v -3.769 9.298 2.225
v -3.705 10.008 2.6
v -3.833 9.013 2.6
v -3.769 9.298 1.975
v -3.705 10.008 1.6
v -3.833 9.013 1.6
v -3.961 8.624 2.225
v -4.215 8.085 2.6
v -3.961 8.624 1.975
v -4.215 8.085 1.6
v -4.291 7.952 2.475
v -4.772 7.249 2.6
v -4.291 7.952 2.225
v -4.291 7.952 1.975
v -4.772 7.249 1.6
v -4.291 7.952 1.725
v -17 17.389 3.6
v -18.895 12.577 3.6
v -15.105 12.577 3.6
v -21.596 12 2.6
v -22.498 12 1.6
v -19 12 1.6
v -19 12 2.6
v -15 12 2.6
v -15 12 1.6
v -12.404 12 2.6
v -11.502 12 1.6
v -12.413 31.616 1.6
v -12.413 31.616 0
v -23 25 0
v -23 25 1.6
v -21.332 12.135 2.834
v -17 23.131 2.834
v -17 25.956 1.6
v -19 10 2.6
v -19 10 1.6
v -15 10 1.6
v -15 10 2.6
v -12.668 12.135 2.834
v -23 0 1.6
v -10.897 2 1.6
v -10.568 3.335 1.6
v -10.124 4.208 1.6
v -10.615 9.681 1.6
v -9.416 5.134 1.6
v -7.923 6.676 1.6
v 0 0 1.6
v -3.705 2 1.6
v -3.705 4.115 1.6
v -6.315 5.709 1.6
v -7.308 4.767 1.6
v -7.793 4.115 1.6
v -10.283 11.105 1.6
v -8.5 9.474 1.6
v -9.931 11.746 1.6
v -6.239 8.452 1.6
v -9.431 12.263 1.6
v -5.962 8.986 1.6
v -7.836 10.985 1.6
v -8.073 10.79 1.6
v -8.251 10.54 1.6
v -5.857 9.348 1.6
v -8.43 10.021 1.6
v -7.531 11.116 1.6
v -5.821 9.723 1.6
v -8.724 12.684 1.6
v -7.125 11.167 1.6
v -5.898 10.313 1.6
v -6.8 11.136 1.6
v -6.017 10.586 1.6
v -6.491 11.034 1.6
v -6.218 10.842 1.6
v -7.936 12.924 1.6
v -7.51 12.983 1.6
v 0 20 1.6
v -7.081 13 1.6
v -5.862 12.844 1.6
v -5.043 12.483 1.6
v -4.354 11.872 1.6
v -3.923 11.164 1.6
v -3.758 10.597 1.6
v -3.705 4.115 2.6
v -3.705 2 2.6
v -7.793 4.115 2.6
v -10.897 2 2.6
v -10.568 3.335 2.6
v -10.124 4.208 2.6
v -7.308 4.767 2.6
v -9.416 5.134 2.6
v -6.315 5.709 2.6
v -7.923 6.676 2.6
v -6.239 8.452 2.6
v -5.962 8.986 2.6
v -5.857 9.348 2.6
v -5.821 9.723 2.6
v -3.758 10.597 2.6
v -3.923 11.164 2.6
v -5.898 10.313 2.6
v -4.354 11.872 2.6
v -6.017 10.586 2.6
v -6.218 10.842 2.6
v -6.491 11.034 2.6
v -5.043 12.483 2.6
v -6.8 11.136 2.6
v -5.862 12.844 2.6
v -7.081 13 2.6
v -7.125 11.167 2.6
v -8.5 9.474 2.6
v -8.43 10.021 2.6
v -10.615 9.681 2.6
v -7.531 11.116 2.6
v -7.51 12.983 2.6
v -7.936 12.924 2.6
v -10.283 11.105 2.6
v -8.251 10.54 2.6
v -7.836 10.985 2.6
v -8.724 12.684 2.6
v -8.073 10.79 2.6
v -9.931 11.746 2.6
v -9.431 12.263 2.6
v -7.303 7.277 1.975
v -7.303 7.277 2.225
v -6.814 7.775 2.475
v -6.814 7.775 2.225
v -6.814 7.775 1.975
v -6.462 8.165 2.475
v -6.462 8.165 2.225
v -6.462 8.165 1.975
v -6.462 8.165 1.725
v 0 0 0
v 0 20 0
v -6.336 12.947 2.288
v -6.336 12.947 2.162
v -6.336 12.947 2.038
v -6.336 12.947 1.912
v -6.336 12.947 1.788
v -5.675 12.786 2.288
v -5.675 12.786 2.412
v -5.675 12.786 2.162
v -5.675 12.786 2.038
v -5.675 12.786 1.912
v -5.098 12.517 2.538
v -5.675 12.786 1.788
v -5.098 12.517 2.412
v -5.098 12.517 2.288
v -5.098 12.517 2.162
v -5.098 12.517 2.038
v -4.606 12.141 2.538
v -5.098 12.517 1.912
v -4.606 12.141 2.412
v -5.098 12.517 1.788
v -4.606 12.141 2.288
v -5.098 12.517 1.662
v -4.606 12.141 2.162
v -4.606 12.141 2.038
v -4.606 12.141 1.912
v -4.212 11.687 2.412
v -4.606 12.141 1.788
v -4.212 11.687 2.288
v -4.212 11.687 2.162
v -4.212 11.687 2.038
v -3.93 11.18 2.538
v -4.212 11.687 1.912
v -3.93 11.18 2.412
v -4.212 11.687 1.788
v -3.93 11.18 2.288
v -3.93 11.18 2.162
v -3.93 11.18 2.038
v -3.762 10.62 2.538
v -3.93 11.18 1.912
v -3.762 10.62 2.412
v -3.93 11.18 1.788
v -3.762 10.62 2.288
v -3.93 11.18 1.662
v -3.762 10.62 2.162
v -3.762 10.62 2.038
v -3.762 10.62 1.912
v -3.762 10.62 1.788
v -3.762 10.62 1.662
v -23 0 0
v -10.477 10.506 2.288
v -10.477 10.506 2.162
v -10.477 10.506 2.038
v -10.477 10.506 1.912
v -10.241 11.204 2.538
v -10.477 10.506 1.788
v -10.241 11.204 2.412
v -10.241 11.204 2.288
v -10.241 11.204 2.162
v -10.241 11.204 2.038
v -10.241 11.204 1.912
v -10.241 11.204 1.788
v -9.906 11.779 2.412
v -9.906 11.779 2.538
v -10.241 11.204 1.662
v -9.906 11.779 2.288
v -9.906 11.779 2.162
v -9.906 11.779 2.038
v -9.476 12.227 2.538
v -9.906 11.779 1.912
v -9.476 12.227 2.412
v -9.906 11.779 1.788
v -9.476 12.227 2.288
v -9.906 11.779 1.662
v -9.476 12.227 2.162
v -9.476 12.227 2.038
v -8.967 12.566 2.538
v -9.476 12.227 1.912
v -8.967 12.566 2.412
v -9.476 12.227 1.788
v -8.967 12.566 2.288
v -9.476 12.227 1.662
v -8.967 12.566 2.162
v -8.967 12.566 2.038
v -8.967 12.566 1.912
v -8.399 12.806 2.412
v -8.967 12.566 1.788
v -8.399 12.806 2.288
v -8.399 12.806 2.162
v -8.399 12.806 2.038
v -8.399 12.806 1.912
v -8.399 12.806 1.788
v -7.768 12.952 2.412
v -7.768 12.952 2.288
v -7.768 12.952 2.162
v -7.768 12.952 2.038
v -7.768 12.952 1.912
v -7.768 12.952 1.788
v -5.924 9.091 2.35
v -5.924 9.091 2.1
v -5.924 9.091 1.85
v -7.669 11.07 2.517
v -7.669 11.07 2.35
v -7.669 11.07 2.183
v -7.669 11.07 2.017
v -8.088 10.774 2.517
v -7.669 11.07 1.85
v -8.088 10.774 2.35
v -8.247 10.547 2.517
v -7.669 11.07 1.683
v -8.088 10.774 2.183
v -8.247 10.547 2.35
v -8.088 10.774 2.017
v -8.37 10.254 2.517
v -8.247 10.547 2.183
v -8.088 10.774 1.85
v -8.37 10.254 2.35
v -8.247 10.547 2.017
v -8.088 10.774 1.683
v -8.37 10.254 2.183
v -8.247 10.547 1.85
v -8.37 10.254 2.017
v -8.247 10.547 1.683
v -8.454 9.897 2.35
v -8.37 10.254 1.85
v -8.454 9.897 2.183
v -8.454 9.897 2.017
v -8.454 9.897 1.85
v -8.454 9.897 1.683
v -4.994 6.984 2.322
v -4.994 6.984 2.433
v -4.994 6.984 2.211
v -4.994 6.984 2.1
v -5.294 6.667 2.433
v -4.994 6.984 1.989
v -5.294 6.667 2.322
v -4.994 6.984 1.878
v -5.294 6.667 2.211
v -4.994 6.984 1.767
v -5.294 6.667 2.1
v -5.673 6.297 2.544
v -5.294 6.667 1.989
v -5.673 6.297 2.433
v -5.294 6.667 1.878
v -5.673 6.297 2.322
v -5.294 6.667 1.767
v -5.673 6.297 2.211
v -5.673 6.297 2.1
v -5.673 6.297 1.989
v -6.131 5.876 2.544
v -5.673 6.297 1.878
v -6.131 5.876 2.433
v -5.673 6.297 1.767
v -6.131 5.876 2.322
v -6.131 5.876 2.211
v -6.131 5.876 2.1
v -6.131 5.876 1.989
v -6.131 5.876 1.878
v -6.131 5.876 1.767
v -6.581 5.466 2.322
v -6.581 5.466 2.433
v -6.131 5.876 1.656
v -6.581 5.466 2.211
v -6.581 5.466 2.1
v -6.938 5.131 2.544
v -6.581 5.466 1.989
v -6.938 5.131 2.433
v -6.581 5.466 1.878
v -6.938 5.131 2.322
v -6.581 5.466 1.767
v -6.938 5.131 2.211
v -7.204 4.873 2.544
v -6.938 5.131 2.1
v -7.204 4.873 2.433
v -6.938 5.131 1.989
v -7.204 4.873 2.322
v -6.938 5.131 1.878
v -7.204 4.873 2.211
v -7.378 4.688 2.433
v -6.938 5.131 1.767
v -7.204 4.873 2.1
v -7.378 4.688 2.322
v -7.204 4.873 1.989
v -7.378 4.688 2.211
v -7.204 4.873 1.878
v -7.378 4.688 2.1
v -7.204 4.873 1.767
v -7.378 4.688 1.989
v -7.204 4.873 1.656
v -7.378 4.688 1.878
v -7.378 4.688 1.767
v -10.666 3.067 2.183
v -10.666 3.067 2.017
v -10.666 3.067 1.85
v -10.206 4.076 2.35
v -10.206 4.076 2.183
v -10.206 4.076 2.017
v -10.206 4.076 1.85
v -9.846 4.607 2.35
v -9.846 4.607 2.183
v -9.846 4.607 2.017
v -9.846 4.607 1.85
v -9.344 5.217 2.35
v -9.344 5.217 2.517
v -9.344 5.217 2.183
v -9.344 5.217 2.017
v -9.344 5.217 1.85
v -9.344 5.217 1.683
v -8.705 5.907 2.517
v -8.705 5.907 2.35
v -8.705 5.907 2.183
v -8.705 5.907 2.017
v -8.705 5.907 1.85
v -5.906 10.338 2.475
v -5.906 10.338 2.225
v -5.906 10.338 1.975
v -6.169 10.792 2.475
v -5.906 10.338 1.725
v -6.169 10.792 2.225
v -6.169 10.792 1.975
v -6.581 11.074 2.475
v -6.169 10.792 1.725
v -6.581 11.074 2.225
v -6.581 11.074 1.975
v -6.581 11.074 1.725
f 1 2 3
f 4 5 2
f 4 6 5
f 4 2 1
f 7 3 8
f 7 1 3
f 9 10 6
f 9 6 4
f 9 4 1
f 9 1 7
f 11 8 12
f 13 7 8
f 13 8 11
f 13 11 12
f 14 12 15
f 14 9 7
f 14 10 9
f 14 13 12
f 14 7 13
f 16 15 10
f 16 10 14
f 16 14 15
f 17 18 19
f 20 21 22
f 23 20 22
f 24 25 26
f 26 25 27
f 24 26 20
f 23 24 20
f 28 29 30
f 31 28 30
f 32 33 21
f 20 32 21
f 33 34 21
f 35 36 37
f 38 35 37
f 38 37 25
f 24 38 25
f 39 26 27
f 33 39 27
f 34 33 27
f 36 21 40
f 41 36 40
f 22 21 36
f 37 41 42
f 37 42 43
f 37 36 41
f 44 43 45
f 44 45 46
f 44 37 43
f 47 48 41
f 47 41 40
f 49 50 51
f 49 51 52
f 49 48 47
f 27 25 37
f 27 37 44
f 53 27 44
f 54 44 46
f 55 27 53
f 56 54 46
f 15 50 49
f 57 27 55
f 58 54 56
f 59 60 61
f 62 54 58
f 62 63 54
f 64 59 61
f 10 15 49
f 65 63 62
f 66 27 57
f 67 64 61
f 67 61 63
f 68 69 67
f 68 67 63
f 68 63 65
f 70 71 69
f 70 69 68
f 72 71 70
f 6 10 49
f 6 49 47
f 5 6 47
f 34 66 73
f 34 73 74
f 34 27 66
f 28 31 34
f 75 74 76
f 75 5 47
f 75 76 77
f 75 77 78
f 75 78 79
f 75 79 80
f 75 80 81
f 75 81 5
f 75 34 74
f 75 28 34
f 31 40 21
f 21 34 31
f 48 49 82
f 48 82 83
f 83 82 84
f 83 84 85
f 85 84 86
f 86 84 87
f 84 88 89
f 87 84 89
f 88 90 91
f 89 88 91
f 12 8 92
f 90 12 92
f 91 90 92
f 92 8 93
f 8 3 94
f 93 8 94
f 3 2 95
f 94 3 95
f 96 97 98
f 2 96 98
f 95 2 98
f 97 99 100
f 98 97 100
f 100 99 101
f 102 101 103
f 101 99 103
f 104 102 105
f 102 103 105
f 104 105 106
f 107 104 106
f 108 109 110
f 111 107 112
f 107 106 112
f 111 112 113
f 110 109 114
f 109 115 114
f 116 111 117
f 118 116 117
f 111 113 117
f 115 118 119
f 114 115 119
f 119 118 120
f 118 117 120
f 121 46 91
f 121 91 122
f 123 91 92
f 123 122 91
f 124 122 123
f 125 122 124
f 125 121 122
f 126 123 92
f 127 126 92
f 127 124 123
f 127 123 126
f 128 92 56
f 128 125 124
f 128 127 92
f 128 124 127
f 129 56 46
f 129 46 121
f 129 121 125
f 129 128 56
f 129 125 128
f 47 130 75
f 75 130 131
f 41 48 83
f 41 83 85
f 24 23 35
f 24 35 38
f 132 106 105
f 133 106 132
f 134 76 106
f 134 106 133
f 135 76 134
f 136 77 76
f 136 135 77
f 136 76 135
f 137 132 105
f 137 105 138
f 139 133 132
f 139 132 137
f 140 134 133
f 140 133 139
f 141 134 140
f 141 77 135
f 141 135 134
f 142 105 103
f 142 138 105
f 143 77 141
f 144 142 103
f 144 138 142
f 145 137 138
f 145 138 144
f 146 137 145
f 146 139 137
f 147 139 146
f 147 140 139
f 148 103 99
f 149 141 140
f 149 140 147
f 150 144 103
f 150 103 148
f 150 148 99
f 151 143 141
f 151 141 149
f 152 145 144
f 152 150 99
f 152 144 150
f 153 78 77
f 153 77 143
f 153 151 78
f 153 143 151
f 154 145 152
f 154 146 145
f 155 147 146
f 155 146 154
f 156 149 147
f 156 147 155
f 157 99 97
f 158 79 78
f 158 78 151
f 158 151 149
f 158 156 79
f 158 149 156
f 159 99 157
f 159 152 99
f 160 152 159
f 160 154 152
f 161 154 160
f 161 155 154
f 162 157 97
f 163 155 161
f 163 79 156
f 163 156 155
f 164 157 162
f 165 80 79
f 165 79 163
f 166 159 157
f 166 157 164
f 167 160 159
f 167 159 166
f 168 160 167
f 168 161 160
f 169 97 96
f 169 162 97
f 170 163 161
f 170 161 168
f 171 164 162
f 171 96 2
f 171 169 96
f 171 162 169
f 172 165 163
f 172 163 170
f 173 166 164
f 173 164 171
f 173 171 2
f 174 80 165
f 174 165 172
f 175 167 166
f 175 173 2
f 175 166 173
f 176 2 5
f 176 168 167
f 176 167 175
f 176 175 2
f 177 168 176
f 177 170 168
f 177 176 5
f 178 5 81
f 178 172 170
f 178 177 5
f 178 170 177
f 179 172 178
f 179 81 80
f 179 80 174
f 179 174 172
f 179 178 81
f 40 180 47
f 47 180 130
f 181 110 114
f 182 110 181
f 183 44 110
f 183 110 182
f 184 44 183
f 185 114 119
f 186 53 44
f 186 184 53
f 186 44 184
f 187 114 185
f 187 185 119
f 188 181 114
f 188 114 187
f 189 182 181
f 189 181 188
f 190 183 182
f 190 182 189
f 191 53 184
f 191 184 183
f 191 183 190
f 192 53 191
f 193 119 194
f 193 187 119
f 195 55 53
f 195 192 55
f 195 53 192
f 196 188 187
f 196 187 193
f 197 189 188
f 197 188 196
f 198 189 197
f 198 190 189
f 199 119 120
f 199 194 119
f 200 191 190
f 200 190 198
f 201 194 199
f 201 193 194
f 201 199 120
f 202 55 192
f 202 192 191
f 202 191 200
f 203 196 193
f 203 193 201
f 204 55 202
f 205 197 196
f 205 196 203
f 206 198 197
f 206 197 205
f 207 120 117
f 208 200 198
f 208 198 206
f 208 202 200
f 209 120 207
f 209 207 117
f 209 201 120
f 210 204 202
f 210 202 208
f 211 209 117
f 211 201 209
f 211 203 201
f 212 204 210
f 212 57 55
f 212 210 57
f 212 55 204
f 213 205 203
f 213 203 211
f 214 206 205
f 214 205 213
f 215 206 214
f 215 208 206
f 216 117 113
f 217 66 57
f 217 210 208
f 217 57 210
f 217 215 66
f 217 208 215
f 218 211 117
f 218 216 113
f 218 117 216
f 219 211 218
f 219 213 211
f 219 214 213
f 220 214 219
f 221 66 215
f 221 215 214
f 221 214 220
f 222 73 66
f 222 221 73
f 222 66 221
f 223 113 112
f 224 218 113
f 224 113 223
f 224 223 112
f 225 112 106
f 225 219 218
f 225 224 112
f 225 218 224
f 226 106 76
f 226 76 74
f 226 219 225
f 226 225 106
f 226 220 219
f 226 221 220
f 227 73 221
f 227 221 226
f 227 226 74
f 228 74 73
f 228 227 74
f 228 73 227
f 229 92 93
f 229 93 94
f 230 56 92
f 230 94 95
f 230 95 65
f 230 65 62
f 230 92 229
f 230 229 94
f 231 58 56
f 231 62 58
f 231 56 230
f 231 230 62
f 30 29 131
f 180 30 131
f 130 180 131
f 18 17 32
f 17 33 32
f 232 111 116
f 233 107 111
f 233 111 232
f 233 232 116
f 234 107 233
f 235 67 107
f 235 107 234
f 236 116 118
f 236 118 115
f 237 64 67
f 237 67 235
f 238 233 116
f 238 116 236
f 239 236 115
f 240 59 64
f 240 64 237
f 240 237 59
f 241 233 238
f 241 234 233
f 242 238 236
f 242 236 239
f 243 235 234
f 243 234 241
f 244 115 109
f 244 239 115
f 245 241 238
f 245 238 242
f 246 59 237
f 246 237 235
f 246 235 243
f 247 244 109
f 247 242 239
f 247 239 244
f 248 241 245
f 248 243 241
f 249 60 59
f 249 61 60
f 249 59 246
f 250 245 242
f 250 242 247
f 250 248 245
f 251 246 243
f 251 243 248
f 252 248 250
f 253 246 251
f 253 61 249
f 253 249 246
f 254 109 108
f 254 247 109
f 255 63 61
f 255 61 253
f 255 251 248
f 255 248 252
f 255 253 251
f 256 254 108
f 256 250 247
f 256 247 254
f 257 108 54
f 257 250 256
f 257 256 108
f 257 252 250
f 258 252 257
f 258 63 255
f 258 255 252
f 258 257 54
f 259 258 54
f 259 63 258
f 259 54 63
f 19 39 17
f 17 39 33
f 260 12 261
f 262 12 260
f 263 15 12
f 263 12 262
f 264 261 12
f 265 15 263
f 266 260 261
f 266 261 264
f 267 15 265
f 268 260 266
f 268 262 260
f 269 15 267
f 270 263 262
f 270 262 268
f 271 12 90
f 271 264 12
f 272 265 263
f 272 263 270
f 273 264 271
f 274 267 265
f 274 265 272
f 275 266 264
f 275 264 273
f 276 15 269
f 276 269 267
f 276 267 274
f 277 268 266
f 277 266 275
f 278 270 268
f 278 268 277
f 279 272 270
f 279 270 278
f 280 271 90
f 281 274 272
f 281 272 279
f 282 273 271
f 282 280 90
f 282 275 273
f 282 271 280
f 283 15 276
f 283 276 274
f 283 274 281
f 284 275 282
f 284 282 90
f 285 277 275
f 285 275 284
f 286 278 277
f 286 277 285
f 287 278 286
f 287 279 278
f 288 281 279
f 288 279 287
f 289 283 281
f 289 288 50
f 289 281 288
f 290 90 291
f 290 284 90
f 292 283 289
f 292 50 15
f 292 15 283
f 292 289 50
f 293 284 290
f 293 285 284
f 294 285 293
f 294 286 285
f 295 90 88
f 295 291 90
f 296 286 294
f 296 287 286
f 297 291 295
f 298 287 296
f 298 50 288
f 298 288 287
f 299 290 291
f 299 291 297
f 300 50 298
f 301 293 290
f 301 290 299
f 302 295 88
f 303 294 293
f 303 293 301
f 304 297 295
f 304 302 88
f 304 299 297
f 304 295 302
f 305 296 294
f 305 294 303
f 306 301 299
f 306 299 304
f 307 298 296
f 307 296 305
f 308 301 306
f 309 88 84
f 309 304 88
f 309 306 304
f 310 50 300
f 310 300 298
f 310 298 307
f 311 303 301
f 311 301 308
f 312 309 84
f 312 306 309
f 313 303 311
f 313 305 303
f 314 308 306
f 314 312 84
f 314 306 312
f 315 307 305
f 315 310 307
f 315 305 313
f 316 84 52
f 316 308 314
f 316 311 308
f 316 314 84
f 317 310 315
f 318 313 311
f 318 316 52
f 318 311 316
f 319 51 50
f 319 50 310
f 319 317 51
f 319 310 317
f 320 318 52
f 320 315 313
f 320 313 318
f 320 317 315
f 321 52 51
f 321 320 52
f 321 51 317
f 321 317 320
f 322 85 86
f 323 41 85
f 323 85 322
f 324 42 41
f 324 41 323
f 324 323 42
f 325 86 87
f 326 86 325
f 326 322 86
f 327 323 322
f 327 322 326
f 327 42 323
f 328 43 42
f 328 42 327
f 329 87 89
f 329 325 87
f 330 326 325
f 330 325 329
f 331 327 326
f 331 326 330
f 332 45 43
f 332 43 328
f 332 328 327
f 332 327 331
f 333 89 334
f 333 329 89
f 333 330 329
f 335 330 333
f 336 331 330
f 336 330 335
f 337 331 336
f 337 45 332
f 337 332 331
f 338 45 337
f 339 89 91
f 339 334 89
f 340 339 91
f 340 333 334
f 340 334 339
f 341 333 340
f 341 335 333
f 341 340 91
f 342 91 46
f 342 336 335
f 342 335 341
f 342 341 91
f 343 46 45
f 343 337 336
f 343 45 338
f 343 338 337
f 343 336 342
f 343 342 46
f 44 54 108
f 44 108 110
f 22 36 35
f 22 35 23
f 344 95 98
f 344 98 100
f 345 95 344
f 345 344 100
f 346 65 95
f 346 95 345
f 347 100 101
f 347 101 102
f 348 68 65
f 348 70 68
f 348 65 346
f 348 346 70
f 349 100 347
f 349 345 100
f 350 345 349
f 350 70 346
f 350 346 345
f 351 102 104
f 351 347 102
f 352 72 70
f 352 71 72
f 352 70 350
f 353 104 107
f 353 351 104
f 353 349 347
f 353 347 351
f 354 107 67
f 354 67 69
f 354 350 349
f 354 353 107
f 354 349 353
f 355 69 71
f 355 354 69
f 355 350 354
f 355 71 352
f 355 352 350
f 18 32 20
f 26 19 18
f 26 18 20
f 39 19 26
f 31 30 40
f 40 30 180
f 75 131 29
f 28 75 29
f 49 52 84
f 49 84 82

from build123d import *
from OCP.BRepFilletAPI import BRepFilletAPI_MakeChamfer

# Parameters (mm, degrees)
P_IDAT_VYSUNUT_M5_DEPTH = 1.6
P_IDAT_VYSUNUT_M6_DEPTH = 2
SKICA2_7_W              = 2
SKICA2_7_H              = 2
P_IDAT_VYSUNUT_M7_DEPTH = 1
P_IDAT_VYSUNUT_M8_DEPTH = 1
ZKOSEN_5_SIZE2          = 1.678199262
ZKOSEN_5_SIZE           = 2
ZKOSEN_8_SIZE2          = 2
ZKOSEN_8_SIZE           = 1.678199262
ZKOSEN_12_SIZE          = 1.461883237
ZKOSEN_12_SIZE_2        = 1
ZKOSEN_12_SIZE_3        = 0.577350269


with BuildPart() as part:
    # Skica1 → Přidat vysunutím5 (new body)
    with BuildSketch(Plane.XY):
        Polygon((0, 0), (0, 20), (-12.412784718, 31.615626352), (-23, 25), (-23, 0), align=None)
    extrude(amount=P_IDAT_VYSUNUT_M5_DEPTH)

    # Skica2 → Přidat vysunutím6 (add)
    with BuildSketch(Plane.XY.offset(1.6)):
        Polygon((-17, 25.95626352), (-17, 12), (-15, 12), (-11.502481599, 12), align=None)
        Polygon((-22.497518401, 12), (-19, 12), (-17, 12), (-17, 25.95626352), align=None)
    extrude(amount=P_IDAT_VYSUNUT_M6_DEPTH)

    # Skica2<7> → Přidat vysunutím7 (add)
    with BuildSketch(Plane.XY.offset(1.6)):
        with Locations((-16, 11)):
            Rectangle(SKICA2_7_W, SKICA2_7_H)
        with Locations((-18, 11)):
            Rectangle(SKICA2_7_W, SKICA2_7_H)
    extrude(amount=P_IDAT_VYSUNUT_M7_DEPTH)

    # Skica3 → Přidat vysunutím8 (add)
    with BuildSketch(Plane.XY.offset(1.6)):
        with BuildLine():
            Line((-3.705128205, 4.115384615), (-3.705128205, 2))
            Line((-3.705128205, 2), (-10.897435897, 2))
            add(Edge.make_bspline(
                [(-10.897435897, 2), (-10.87308441, 2.180790308), (-10.824395089, 2.542269551), (-10.673865117, 3.070299742), (-10.472959166, 3.585566992), (-10.254913916, 4.004869463), (-10.038043764, 4.342393523), (-9.841277463, 4.618963346), (-9.60654249, 4.913221767), (-9.337245105, 5.227544267), (-9.034873554, 5.562913411), (-8.697171951, 5.918082368), (-8.322529407, 6.291350846), (-8.058961705, 6.54481851), (-7.922676282, 6.67588141)],
                knots=[0, 0, 0, 0, 1.156289446, 2.311930546, 3.473459201, 4.661751613, 5.303057008, 6.018253237, 6.81459331, 7.690699809, 8.644447906, 9.679642995, 10.800191253, 12, 12, 12, 12], degree=3))
            add(Edge.make_bspline(
                [(-7.922676282, 6.67588141), (-7.813918956, 6.780862005), (-7.606877039, 6.980714138), (-7.312048947, 7.266894293), (-7.052864674, 7.529975199), (-6.823905036, 7.763139303), (-6.630459323, 7.972323552), (-6.469982936, 8.154242742), (-6.34044346, 8.309637702), (-6.270284768, 8.408220362), (-6.239182692, 8.451923077)],
                knots=[0, 0, 0, 0, 1.480720495, 2.818855715, 4.024636094, 5.098235712, 6.019786162, 6.815086302, 7.474715479, 8, 8, 8, 8], degree=3))
            add(Edge.make_bspline(
                [(-6.239182692, 8.451923077), (-6.175493233, 8.557718073), (-6.052643645, 8.761784362), (-5.91792888, 9.082682292), (-5.837068057, 9.403513936), (-5.825971765, 9.617891805), (-5.820512821, 9.723357372)],
                knots=[0, 0, 0, 0, 1.0911822, 2.104764037, 3.067617678, 4, 4, 4, 4], degree=3))
            add(Edge.make_bspline(
                [(-5.820512821, 9.723357372), (-5.824474653, 9.833108474), (-5.831970132, 10.040748999), (-5.894821019, 10.333768175), (-6.006276867, 10.585659667), (-6.15973106, 10.797196661), (-6.353774193, 10.962935085), (-6.580616259, 11.085399693), (-6.843577862, 11.153106661), (-7.028402789, 11.16201224), (-7.125, 11.166666667)],
                knots=[0, 0, 0, 0, 1.193122327, 2.257294386, 3.237245624, 4.168877528, 5.075331632, 5.990371598, 6.949684428, 8, 8, 8, 8], degree=3))
            add(Edge.make_bspline(
                [(-7.125, 11.166666667), (-7.220944609, 11.16231978), (-7.406288878, 11.153922533), (-7.669703299, 11.080565334), (-7.900142302, 10.953576306), (-8.06436539, 10.808860058), (-8.175305876, 10.668134018), (-8.250896853, 10.545500545), (-8.316050374, 10.406151312), (-8.37378183, 10.251655158), (-8.419383153, 10.080242168), (-8.456107626, 9.893217825), (-8.485702239, 9.689575671), (-8.495113848, 9.547907653), (-8.5, 9.474358974)],
                knots=[0, 0, 0, 0, 1.402788338, 2.709884207, 3.961032948, 5.225417836, 5.883680772, 6.578928686, 7.329201998, 8.132101139, 8.990263233, 9.922304639, 10.921339128, 12, 12, 12, 12], degree=3))
            Line((-8.5, 9.474358974), (-10.615384615, 9.681490385))
            add(Edge.make_bspline(
                [(-10.615384615, 9.681490385), (-10.598377251, 9.824305509), (-10.565402688, 10.101201217), (-10.483114114, 10.498918926), (-10.378898684, 10.865831465), (-10.247788098, 11.201257911), (-10.095201314, 11.507331251), (-9.913355139, 11.779458664), (-9.708603468, 12.020654551), (-9.480769352, 12.230790543), (-9.231301205, 12.410535137), (-8.969529148, 12.57098477), (-8.690337423, 12.702604473), (-8.396799939, 12.811078884), (-8.089049352, 12.897770766), (-7.765662274, 12.955090263), (-7.42863453, 12.995409017), (-7.198577984, 12.998446608), (-7.080929487, 13)],
                knots=[0, 0, 0, 0, 1.270971563, 2.464210789, 3.586263665, 4.638946707, 5.643716971, 6.603612468, 7.52484387, 8.434700188, 9.336036235, 10.239171475, 11.145359471, 12.059630629, 13.003312604, 13.96741569, 14.960557767, 16, 16, 16, 16], degree=3))
            add(Edge.make_bspline(
                [(-7.080929487, 13), (-6.953030371, 12.997541845), (-6.703930784, 12.992754281), (-6.34028961, 12.953218534), (-5.998674853, 12.884282231), (-5.676099879, 12.79296634), (-5.375877361, 12.67105295), (-5.095505554, 12.52366473), (-4.83939702, 12.345207999), (-4.603734114, 12.145414763), (-4.393070332, 11.925706984), (-4.20854792, 11.691351493), (-4.053955652, 11.442511564), (-3.924228998, 11.182220281), (-3.827907833, 10.90628918), (-3.757724044, 10.618533633), (-3.711189366, 10.317611197), (-3.707170936, 10.112088), (-3.705128205, 10.007612179)],
                knots=[0, 0, 0, 0, 1.210756838, 2.35810096, 3.457354827, 4.507168606, 5.527358126, 6.519769748, 7.499700793, 8.476517721, 9.440526811, 10.376769937, 11.295256217, 12.209626307, 13.124630862, 14.055668209, 15.011616881, 16, 16, 16, 16], degree=3))
            add(Edge.make_bspline(
                [(-3.705128205, 10.007612179), (-3.707819477, 9.887707131), (-3.713158546, 9.649833916), (-3.764276175, 9.298186238), (-3.84237396, 8.954647512), (-3.957796338, 8.618378159), (-4.104103161, 8.28131186), (-4.292696164, 7.942692037), (-4.511666905, 7.592306518), (-4.683112364, 7.36576699), (-4.771634615, 7.248798077)],
                knots=[0, 0, 0, 0, 0.953409949, 1.89141903, 2.821310783, 3.752688675, 4.715703262, 5.740811754, 6.833515735, 8, 8, 8, 8], degree=3))
            add(Edge.make_bspline(
                [(-4.771634615, 7.248798077), (-4.80509214, 7.206658226), (-4.876750403, 7.116404431), (-4.998659939, 6.978014195), (-5.139942605, 6.826848432), (-5.298602846, 6.660077667), (-5.479881522, 6.483607708), (-5.677256214, 6.290058721), (-5.899411985, 6.089331377), (-6.12951153, 5.876418507), (-6.360611244, 5.669193404), (-6.5730252, 5.472375498), (-6.765967752, 5.298233923), (-6.930453202, 5.137155265), (-7.076156545, 5.000133027), (-7.197826149, 4.880140867), (-7.29773874, 4.780083699), (-7.43541186, 4.624119958), (-7.610585282, 4.413178934), (-7.733826947, 4.21161882), (-7.792668269, 4.115384615)],
                knots=[0, 0, 0, 0, 0.665555651, 1.425465941, 2.280616993, 3.225313414, 4.272635571, 5.410053715, 6.644756443, 7.976022804, 9.288331007, 10.484517221, 11.558462543, 12.503158964, 13.33222979, 14.032602617, 14.617328242, 15.080653724, 16.606167857, 18, 18, 18, 18], degree=3))
            Line((-7.792668269, 4.115384615), (-3.705128205, 4.115384615))
        make_face()
    extrude(amount=P_IDAT_VYSUNUT_M8_DEPTH)

    # Zkosení5
    zkosen_5_edges = [part.edges().sort_by_distance(p)[0] for p in [
        (-14.2512408, 18.97813176, 3.6),
    ]]
    zkosen_5_side = [part.faces().sort_by_distance(p)[0] for p in [
        (-14.2512408, 18.97813176, 3.566436015),
    ]]
    chamfer(zkosen_5_edges, length=ZKOSEN_5_SIZE - 0.0001, length2=ZKOSEN_5_SIZE2 - 0.0001, reference=zkosen_5_side[0])  # a hair under: the kernel refuses the full size

    # Zkosení8
    zkosen_8_edges = [part.edges().sort_by_distance(p)[0] for p in [
        (-20.1996587, 17.833456695, 3.6),
    ]]
    zkosen_8_side = [part.faces().sort_by_distance(p)[0] for p in [
        (-20.168430178, 17.821155453, 3.6),
    ]]
    chamfer(zkosen_8_edges, length=ZKOSEN_8_SIZE - 0.0001, length2=ZKOSEN_8_SIZE2 - 0.0001, reference=zkosen_8_side[0])  # a hair under: the kernel refuses the full size

    # Zkosení12
    zkosen_12_edges_1 = [part.edges().sort_by_distance(p)[0] for p in [
        (-15.153039798, 16.68878163, 3.6),
    ]]
    zkosen_12_side_1 = [part.faces().sort_by_distance(p)[0] for p in [
        (-15.171648149, 16.681451605, 3.6),
    ]]
    zkosen_12_edges_2 = [part.edges().sort_by_distance(p)[0] for p in [
        (-17, 12, 3.6),
    ]]
    zkosen_12_side_2 = [part.faces().sort_by_distance(p)[0] for p in [
        (-17, 12, 3.588452995),
    ]]
    zkosen_12_edges_3 = [part.edges().sort_by_distance(p)[0] for p in [
        (-18.846960202, 16.68878163, 3.6),
    ]]
    zkosen_12_side_3 = [part.faces().sort_by_distance(p)[0] for p in [
        (-18.828351851, 16.681451605, 3.6),
    ]]
    zkosen_12 = BRepFilletAPI_MakeChamfer(part.part.solid().wrapped)
    for e in zkosen_12_edges_1:
        zkosen_12.Add(ZKOSEN_12_SIZE - 0.0001, ZKOSEN_12_SIZE_2 - 0.0001, e.wrapped, zkosen_12_side_1[0].wrapped)
    for e in zkosen_12_edges_2:
        zkosen_12.Add(ZKOSEN_12_SIZE_2 - 0.0001, ZKOSEN_12_SIZE_3 - 0.0001, e.wrapped, zkosen_12_side_2[0].wrapped)
    for e in zkosen_12_edges_3:
        zkosen_12.Add(ZKOSEN_12_SIZE - 0.0001, ZKOSEN_12_SIZE_2 - 0.0001, e.wrapped, zkosen_12_side_3[0].wrapped)
    add(Compound.cast(zkosen_12.Shape()), mode=Mode.REPLACE)  # a hair under: the kernel refuses the full size


solid = part.part
